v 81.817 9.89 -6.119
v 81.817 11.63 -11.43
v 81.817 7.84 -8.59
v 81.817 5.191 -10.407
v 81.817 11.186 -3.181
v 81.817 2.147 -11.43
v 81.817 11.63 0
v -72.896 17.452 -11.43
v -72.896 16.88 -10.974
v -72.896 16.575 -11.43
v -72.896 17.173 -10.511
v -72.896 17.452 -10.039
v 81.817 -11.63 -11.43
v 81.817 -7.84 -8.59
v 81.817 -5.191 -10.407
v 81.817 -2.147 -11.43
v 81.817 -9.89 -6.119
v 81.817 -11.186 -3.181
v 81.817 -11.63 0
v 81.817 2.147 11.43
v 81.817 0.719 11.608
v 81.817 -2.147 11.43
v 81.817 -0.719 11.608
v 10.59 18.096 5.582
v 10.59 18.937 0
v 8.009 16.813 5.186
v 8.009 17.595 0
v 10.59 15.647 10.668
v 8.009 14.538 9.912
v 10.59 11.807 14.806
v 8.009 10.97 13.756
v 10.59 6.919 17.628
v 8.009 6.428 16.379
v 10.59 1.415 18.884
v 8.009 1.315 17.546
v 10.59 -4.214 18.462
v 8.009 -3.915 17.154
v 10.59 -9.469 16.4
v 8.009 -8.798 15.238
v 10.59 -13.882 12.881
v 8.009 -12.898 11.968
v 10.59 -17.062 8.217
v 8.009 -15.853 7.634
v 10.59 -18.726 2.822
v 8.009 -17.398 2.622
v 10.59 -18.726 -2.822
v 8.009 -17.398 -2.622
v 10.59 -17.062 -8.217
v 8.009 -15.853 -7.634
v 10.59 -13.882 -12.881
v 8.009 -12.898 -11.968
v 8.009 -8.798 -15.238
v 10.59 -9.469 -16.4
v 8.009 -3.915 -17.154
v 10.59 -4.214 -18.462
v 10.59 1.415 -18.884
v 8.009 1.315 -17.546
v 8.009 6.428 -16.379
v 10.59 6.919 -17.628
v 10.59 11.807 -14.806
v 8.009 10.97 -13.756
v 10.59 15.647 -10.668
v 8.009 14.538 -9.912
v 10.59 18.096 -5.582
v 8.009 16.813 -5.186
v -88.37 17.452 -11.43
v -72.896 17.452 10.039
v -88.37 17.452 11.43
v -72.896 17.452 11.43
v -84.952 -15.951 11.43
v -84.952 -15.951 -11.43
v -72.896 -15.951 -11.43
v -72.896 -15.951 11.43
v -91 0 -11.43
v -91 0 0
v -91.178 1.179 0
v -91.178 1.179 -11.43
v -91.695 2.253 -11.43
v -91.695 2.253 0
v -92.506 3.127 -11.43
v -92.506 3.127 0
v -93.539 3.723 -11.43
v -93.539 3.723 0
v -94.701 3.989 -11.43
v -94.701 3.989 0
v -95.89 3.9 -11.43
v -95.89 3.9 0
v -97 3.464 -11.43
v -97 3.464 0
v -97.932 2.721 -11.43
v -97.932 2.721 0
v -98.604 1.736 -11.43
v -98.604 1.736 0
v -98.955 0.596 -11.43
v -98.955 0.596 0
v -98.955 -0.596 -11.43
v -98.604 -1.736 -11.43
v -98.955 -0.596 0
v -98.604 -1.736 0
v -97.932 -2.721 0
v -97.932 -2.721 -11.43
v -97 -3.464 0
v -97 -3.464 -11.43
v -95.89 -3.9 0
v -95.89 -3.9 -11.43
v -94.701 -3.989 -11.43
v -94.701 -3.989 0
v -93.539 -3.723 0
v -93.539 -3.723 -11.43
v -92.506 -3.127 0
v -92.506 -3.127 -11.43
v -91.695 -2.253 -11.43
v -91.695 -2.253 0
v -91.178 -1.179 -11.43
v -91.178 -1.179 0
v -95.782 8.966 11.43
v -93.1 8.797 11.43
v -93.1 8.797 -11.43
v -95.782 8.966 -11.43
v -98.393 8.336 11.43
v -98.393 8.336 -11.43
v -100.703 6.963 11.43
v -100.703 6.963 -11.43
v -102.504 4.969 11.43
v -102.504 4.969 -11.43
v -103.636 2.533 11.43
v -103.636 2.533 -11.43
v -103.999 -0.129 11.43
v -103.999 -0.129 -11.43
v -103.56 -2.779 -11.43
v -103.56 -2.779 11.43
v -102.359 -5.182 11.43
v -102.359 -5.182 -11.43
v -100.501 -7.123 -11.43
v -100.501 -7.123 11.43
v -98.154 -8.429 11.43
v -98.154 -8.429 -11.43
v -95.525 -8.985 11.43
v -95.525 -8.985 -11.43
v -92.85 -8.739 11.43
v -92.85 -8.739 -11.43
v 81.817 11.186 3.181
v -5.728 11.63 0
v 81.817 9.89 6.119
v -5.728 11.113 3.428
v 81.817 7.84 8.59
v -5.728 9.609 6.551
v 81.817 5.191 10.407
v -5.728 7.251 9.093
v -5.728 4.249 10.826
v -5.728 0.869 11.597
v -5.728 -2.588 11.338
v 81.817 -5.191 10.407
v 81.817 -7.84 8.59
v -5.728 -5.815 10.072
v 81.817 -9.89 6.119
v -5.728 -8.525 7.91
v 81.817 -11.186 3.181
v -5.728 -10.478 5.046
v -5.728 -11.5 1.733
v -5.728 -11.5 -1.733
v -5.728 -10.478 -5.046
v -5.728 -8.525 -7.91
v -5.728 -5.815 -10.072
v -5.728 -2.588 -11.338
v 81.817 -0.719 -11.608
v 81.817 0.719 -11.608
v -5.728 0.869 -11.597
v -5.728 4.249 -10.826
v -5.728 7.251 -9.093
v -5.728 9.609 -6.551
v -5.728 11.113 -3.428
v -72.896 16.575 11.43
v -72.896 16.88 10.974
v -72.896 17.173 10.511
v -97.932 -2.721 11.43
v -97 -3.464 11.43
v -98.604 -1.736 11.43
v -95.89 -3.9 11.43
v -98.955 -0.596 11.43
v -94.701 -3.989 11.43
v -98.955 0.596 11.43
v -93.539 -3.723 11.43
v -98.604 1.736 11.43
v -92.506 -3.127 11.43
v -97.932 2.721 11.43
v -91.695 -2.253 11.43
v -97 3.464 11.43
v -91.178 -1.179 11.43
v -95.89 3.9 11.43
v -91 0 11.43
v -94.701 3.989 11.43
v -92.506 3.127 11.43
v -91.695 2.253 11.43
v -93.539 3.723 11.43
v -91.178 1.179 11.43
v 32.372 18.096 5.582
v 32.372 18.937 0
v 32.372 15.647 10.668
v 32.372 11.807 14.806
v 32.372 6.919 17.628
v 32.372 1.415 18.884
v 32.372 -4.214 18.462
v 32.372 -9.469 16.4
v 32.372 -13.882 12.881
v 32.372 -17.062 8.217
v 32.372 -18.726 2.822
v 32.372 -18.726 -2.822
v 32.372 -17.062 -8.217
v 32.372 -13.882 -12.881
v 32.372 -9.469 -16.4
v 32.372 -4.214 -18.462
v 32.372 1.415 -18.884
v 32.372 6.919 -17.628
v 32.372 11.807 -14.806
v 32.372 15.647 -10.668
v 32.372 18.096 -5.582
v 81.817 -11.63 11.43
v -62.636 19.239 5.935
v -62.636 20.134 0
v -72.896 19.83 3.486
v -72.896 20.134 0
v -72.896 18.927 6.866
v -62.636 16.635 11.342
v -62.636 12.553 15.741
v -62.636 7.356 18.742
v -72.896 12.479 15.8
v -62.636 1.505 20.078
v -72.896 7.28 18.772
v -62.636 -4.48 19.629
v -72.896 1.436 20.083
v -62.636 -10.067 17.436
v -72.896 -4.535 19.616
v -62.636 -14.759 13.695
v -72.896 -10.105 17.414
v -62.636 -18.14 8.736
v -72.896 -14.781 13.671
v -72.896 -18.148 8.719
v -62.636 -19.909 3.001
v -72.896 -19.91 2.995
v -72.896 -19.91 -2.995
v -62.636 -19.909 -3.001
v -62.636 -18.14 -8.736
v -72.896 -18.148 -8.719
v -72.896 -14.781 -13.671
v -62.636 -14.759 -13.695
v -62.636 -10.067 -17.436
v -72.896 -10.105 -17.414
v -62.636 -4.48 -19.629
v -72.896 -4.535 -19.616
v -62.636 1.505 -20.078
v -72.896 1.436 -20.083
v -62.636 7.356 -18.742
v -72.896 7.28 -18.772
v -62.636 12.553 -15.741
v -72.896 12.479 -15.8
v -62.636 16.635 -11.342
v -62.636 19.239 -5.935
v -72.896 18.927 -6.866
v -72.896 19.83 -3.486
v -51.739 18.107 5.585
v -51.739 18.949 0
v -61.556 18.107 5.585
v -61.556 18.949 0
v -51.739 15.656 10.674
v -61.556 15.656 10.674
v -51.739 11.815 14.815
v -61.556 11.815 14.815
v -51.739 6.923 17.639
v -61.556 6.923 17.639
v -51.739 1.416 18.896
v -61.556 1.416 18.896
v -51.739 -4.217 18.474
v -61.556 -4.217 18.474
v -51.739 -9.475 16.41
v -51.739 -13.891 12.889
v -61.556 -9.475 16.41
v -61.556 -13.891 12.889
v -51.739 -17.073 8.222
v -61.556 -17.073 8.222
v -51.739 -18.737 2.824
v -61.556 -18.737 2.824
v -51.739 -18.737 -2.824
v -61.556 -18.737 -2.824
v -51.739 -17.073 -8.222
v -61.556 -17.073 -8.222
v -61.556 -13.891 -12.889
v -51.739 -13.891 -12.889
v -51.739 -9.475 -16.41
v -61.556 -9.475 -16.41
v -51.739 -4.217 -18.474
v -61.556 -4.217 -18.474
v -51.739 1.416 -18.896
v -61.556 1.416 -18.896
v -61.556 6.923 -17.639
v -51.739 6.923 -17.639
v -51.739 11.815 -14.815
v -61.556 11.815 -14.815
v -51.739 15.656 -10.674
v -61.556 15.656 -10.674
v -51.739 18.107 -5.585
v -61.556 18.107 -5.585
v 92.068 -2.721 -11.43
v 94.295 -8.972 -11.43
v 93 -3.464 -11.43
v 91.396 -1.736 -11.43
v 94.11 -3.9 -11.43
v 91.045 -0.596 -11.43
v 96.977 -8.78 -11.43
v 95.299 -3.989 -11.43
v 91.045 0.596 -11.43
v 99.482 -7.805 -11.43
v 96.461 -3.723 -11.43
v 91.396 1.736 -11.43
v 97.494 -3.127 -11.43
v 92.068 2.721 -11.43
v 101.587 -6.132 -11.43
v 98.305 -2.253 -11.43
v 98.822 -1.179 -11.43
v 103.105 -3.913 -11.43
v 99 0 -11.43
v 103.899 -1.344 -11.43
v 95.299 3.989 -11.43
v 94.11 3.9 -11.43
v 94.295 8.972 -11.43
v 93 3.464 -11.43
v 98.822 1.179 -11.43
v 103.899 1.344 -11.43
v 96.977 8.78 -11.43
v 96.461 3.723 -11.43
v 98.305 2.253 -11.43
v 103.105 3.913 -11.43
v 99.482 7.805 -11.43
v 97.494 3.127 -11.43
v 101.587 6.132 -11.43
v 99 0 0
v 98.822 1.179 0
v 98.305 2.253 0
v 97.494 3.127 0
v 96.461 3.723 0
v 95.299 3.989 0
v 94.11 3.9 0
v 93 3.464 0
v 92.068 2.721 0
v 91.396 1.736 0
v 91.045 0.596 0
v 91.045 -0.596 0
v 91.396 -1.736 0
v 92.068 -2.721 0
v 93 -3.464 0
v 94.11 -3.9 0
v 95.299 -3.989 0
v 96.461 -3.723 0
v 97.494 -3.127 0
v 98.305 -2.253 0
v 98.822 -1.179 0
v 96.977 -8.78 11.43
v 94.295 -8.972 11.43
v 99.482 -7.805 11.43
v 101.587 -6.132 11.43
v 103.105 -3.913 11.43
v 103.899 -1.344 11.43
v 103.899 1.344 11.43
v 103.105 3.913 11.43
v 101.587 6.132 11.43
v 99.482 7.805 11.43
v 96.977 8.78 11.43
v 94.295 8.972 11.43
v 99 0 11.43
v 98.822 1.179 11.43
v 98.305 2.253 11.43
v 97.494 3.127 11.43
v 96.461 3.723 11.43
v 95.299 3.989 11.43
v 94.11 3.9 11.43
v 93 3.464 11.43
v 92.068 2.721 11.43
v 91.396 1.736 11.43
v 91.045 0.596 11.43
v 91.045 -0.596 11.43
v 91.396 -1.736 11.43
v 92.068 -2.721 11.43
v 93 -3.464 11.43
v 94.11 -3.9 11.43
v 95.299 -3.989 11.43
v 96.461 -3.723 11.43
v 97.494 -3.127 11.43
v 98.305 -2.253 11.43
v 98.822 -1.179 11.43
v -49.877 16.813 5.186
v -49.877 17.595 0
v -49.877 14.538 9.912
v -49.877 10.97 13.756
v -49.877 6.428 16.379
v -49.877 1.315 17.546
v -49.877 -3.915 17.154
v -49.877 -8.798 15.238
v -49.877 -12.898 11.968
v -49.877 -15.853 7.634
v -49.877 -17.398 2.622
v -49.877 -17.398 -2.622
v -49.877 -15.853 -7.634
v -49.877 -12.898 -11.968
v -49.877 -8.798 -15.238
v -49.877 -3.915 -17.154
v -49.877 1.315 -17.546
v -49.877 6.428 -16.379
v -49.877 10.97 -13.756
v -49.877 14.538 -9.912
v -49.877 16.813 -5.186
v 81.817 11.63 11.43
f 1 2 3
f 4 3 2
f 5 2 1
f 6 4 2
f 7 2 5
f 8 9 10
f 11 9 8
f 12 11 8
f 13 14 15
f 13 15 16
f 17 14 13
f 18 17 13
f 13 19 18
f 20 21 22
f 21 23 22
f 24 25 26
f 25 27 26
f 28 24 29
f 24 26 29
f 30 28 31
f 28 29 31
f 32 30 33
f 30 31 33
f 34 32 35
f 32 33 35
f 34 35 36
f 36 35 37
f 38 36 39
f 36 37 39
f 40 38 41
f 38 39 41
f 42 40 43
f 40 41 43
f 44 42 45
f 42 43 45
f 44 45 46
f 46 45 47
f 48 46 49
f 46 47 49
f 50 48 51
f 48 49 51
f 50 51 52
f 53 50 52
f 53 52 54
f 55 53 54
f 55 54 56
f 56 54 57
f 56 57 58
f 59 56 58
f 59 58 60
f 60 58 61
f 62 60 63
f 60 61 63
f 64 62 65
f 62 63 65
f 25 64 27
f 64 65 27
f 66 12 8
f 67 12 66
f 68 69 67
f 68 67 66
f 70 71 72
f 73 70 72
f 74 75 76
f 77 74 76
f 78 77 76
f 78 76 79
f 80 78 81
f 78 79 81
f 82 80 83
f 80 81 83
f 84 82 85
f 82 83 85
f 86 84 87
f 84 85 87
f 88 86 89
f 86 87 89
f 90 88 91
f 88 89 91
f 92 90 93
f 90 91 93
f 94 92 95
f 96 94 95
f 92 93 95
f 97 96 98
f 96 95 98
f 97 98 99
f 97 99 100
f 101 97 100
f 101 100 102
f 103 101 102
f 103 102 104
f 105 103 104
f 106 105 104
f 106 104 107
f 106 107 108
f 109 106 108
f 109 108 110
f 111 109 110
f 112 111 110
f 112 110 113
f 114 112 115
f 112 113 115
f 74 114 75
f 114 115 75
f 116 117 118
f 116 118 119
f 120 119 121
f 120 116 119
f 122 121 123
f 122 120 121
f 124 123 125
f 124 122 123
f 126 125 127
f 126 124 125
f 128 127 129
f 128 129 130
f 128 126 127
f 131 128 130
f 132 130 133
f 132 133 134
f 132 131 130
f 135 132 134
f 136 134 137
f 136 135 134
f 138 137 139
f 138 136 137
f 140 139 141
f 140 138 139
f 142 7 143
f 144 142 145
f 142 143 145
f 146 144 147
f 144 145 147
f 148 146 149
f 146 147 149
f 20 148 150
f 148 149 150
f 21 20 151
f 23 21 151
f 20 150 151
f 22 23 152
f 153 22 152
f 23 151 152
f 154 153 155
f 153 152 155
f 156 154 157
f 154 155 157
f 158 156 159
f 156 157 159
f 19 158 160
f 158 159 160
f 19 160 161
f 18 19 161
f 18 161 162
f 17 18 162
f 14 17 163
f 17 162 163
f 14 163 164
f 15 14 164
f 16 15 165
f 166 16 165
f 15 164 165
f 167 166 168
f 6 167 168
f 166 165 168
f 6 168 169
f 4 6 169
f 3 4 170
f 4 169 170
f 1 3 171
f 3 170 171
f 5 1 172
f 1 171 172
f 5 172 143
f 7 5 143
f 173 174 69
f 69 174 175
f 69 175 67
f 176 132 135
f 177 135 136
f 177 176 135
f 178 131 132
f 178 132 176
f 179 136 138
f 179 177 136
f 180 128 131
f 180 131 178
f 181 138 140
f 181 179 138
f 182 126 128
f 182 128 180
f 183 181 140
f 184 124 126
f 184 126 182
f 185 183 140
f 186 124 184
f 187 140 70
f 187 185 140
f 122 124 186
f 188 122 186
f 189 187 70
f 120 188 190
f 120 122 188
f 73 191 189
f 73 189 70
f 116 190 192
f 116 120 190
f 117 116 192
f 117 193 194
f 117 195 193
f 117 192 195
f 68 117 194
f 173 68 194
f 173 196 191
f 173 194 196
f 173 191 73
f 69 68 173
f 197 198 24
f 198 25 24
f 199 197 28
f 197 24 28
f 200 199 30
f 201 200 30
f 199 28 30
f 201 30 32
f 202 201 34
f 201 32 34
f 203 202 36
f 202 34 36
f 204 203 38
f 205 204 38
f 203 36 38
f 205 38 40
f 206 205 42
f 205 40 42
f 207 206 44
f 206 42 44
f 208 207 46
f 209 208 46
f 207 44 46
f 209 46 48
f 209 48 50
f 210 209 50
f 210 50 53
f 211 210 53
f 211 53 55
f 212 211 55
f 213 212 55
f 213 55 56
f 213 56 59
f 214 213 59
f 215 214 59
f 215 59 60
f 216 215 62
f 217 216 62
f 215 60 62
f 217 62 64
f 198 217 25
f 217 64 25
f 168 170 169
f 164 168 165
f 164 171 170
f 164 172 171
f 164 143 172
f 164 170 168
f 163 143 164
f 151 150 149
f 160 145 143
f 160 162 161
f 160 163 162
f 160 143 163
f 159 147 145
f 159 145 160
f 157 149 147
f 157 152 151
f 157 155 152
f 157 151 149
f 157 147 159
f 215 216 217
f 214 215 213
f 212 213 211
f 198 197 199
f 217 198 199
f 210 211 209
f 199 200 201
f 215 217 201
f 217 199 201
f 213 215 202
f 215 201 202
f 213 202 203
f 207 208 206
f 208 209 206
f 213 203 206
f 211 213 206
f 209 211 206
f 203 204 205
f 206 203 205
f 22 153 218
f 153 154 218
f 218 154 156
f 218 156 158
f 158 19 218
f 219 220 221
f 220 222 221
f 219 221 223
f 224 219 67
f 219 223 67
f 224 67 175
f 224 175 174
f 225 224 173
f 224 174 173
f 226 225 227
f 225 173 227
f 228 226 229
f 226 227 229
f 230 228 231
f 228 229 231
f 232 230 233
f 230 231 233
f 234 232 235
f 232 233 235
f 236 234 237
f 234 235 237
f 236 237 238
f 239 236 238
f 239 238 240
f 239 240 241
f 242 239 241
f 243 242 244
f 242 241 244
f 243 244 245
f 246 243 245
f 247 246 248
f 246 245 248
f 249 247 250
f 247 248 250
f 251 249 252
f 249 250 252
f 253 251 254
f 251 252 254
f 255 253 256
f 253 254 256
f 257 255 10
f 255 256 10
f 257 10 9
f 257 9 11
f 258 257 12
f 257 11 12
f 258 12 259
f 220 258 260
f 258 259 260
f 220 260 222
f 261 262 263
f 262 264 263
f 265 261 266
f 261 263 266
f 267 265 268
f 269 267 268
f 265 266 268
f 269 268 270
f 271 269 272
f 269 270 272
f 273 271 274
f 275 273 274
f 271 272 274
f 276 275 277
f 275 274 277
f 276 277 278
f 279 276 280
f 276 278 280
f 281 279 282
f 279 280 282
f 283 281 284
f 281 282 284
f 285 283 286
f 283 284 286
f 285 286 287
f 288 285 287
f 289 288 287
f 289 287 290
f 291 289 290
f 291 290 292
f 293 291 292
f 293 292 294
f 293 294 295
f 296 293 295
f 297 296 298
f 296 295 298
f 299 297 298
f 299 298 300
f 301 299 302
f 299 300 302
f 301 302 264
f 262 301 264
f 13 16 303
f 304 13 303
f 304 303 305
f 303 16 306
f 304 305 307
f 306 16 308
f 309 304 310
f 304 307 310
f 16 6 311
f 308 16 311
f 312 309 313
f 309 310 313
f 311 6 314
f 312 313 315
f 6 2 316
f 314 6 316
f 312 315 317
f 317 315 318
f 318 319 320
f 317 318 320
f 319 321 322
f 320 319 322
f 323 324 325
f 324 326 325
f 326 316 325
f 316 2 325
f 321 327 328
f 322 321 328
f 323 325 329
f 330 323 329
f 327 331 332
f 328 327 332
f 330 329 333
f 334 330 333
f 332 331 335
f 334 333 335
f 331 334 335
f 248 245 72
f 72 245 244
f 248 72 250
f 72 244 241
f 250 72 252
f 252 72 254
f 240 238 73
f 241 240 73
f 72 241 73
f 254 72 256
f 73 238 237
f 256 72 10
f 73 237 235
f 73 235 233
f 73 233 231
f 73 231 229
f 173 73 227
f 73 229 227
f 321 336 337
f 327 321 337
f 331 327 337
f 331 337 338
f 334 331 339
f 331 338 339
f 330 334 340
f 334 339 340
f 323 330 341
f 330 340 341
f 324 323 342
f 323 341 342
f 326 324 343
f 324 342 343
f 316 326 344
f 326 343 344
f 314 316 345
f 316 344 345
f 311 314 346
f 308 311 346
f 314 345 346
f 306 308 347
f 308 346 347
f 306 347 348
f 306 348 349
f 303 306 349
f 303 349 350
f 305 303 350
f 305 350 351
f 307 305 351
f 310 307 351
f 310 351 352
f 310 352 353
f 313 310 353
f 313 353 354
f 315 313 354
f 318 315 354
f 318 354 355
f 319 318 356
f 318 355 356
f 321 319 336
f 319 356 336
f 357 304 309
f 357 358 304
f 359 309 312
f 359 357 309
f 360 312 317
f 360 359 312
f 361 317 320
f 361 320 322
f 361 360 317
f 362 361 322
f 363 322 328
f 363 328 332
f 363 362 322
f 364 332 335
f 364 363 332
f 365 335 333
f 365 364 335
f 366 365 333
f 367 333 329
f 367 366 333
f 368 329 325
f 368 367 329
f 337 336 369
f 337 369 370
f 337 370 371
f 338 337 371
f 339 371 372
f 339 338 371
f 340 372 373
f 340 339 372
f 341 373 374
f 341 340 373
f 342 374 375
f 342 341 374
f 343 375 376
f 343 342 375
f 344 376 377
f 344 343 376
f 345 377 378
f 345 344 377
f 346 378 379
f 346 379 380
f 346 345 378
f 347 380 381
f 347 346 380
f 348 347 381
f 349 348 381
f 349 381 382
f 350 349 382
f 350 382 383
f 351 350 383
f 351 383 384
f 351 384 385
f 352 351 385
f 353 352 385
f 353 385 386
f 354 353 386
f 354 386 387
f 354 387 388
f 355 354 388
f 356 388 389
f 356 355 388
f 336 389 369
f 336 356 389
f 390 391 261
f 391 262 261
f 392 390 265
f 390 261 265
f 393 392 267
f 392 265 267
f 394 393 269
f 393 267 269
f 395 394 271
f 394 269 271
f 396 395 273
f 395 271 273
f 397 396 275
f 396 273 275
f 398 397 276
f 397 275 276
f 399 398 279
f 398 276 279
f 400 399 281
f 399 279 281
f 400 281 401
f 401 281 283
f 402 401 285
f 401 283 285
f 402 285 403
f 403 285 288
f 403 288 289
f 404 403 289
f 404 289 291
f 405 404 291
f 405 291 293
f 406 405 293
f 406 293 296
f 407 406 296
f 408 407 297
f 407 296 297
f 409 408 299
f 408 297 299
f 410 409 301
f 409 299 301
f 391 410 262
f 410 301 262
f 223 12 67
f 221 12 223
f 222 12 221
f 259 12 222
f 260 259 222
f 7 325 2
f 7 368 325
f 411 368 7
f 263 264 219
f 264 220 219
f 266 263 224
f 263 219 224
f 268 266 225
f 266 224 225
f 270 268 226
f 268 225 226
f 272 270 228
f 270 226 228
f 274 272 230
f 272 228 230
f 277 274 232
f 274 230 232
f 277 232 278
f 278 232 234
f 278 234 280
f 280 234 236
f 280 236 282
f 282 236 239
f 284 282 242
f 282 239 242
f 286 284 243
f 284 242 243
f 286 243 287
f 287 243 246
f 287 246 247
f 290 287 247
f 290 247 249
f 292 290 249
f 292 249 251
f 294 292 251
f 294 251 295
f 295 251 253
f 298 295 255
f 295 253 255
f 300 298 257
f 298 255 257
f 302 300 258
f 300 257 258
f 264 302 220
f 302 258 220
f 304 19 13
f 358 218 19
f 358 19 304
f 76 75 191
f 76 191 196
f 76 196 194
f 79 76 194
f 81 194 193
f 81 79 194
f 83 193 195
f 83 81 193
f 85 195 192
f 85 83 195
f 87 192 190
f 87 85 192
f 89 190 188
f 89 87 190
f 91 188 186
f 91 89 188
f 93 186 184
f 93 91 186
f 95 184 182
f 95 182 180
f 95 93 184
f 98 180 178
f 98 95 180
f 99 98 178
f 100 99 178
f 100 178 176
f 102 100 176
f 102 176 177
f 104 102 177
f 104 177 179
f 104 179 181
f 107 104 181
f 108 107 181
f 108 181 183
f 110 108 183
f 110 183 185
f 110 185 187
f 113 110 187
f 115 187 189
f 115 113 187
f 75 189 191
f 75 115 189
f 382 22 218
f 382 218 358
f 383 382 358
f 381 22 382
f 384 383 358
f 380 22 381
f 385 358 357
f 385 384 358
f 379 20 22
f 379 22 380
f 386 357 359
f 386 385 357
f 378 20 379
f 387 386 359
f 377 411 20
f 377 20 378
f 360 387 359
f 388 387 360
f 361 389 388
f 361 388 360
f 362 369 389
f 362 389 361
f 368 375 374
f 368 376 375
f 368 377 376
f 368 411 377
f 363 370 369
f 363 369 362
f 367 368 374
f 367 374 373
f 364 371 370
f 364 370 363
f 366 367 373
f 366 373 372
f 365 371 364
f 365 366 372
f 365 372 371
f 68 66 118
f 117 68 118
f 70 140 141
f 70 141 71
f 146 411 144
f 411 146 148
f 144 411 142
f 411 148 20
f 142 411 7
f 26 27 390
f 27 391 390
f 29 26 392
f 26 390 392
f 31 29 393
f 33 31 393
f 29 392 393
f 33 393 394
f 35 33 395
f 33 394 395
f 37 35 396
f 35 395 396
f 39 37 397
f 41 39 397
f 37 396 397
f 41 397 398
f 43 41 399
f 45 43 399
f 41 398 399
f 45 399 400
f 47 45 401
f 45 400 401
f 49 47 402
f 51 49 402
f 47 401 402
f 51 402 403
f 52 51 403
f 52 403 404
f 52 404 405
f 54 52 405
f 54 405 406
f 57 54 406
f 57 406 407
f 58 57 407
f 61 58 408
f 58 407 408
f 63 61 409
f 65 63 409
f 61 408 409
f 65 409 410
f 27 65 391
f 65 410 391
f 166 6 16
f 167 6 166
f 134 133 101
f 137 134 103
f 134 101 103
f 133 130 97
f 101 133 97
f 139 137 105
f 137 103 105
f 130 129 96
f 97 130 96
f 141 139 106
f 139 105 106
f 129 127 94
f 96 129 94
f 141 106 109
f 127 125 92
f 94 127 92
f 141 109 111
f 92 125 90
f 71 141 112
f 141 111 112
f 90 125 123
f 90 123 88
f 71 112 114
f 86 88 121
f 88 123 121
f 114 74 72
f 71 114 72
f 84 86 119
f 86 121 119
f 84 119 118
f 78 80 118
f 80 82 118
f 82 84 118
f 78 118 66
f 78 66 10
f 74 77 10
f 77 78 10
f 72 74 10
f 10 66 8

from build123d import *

# Parameters (mm, degrees)
F0_W          = 38.1
F0_H          = 11.6298962384
F0_W_2        = 49.4445450604
F0_R          = 4
F3_DEPTH      = 11.43
F3_DEPTH_BACK = 11.43
F4_DEPTH      = 11.43
F4_DEPTH_BACK = 11.43


with BuildPart() as f1:
    # F0 (on Top) → F1 (revolve)
    with BuildSketch(Plane.XY):
        Polygon((10.5896452442, 18.9371332526), (8.0091310665, 17.5950117409), (-49.8771630228, 17.5950117409), (-51.7390035093, 18.949078396), (-61.5559779108, 18.949078396), (-62.6355782151, 20.1338864863), (-72.8956460953, 20.1338864863), (-72.8956460953, 17.4524304397), (-72.8956460953, 0), (-5.7279388368, 0), (-5.7279388368, 11.6298962384), (32.3720611632, 11.6298962384), (32.3720611632, 18.9371332526), align=None)
        with Locations((13.3220611632, 5.8149481192)):
            Rectangle(F0_W, F0_H)
    revolve(axis=Axis((4.4604800642, 0, 0), (1, 0, 0)))

    # F0 (on Top) → F4 (join, two sides)
    with BuildSketch(Plane.XY) as f4_sk:
        with BuildLine():
            Line((-72.8956460953, 0), (-72.8956460953, 17.4524304397))
            Line((-72.8956460953, 17.4524304397), (-88.3703300601, 17.4524304397))
            Line((-88.3703300601, 17.4524304397), (-93.1004801636, 8.7972623237))
            ThreePointArc((-93.1004801636, 8.7972623237), (-103.9990803927, -0.1286549099), (-92.8497686305, -8.7393652548))
            Line((-92.8497686305, -8.7393652548), (-84.9520042539, -15.9512963146))
            Line((-84.9520042539, -15.9512963146), (-72.8956460953, -15.9512963146))
            Line((-72.8956460953, -15.9512963146), (-72.8956460953, 0))
        make_face()
        with Locations((-95, 0)):
            Circle(F0_R, mode=Mode.SUBTRACT)
    extrude(amount=F4_DEPTH)
    extrude(f4_sk.sketch, amount=-F4_DEPTH_BACK)


with BuildPart() as f2:
    # F0 (on Top) → F2 (revolve)
    with BuildSketch(Plane.XY):
        with Locations((57.0943336934, 5.8149481192)):
            Rectangle(F0_W_2, F0_H)
        with Locations((13.3220611632, 5.8149481192)):
            Rectangle(F0_W, F0_H)
    revolve(axis=Axis((4.4604800642, 0, 0), (1, 0, 0)))

    # F0 (on Top) → F3 (join, two sides)
    with BuildSketch(Plane.XY) as f3_sk:
        with BuildLine():
            Line((94.2947969589, 8.972329055), (81.8166062236, 11.6298962384))
            Line((81.8166062236, 11.6298962384), (81.8166062236, 0))
            Line((81.8166062236, 0), (81.8166062236, -11.6298962384))
            Line((81.8166062236, -11.6298962384), (94.2947969589, -8.972329055))
            ThreePointArc((94.2947969589, -8.972329055), (104, 0), (94.2947969589, 8.972329055))
        make_face()
        with Locations((95, 0)):
            Circle(F0_R, mode=Mode.SUBTRACT)
    extrude(amount=F3_DEPTH)
    extrude(f3_sk.sketch, amount=-F3_DEPTH_BACK)


solid = Compound([f1.part, f2.part])
